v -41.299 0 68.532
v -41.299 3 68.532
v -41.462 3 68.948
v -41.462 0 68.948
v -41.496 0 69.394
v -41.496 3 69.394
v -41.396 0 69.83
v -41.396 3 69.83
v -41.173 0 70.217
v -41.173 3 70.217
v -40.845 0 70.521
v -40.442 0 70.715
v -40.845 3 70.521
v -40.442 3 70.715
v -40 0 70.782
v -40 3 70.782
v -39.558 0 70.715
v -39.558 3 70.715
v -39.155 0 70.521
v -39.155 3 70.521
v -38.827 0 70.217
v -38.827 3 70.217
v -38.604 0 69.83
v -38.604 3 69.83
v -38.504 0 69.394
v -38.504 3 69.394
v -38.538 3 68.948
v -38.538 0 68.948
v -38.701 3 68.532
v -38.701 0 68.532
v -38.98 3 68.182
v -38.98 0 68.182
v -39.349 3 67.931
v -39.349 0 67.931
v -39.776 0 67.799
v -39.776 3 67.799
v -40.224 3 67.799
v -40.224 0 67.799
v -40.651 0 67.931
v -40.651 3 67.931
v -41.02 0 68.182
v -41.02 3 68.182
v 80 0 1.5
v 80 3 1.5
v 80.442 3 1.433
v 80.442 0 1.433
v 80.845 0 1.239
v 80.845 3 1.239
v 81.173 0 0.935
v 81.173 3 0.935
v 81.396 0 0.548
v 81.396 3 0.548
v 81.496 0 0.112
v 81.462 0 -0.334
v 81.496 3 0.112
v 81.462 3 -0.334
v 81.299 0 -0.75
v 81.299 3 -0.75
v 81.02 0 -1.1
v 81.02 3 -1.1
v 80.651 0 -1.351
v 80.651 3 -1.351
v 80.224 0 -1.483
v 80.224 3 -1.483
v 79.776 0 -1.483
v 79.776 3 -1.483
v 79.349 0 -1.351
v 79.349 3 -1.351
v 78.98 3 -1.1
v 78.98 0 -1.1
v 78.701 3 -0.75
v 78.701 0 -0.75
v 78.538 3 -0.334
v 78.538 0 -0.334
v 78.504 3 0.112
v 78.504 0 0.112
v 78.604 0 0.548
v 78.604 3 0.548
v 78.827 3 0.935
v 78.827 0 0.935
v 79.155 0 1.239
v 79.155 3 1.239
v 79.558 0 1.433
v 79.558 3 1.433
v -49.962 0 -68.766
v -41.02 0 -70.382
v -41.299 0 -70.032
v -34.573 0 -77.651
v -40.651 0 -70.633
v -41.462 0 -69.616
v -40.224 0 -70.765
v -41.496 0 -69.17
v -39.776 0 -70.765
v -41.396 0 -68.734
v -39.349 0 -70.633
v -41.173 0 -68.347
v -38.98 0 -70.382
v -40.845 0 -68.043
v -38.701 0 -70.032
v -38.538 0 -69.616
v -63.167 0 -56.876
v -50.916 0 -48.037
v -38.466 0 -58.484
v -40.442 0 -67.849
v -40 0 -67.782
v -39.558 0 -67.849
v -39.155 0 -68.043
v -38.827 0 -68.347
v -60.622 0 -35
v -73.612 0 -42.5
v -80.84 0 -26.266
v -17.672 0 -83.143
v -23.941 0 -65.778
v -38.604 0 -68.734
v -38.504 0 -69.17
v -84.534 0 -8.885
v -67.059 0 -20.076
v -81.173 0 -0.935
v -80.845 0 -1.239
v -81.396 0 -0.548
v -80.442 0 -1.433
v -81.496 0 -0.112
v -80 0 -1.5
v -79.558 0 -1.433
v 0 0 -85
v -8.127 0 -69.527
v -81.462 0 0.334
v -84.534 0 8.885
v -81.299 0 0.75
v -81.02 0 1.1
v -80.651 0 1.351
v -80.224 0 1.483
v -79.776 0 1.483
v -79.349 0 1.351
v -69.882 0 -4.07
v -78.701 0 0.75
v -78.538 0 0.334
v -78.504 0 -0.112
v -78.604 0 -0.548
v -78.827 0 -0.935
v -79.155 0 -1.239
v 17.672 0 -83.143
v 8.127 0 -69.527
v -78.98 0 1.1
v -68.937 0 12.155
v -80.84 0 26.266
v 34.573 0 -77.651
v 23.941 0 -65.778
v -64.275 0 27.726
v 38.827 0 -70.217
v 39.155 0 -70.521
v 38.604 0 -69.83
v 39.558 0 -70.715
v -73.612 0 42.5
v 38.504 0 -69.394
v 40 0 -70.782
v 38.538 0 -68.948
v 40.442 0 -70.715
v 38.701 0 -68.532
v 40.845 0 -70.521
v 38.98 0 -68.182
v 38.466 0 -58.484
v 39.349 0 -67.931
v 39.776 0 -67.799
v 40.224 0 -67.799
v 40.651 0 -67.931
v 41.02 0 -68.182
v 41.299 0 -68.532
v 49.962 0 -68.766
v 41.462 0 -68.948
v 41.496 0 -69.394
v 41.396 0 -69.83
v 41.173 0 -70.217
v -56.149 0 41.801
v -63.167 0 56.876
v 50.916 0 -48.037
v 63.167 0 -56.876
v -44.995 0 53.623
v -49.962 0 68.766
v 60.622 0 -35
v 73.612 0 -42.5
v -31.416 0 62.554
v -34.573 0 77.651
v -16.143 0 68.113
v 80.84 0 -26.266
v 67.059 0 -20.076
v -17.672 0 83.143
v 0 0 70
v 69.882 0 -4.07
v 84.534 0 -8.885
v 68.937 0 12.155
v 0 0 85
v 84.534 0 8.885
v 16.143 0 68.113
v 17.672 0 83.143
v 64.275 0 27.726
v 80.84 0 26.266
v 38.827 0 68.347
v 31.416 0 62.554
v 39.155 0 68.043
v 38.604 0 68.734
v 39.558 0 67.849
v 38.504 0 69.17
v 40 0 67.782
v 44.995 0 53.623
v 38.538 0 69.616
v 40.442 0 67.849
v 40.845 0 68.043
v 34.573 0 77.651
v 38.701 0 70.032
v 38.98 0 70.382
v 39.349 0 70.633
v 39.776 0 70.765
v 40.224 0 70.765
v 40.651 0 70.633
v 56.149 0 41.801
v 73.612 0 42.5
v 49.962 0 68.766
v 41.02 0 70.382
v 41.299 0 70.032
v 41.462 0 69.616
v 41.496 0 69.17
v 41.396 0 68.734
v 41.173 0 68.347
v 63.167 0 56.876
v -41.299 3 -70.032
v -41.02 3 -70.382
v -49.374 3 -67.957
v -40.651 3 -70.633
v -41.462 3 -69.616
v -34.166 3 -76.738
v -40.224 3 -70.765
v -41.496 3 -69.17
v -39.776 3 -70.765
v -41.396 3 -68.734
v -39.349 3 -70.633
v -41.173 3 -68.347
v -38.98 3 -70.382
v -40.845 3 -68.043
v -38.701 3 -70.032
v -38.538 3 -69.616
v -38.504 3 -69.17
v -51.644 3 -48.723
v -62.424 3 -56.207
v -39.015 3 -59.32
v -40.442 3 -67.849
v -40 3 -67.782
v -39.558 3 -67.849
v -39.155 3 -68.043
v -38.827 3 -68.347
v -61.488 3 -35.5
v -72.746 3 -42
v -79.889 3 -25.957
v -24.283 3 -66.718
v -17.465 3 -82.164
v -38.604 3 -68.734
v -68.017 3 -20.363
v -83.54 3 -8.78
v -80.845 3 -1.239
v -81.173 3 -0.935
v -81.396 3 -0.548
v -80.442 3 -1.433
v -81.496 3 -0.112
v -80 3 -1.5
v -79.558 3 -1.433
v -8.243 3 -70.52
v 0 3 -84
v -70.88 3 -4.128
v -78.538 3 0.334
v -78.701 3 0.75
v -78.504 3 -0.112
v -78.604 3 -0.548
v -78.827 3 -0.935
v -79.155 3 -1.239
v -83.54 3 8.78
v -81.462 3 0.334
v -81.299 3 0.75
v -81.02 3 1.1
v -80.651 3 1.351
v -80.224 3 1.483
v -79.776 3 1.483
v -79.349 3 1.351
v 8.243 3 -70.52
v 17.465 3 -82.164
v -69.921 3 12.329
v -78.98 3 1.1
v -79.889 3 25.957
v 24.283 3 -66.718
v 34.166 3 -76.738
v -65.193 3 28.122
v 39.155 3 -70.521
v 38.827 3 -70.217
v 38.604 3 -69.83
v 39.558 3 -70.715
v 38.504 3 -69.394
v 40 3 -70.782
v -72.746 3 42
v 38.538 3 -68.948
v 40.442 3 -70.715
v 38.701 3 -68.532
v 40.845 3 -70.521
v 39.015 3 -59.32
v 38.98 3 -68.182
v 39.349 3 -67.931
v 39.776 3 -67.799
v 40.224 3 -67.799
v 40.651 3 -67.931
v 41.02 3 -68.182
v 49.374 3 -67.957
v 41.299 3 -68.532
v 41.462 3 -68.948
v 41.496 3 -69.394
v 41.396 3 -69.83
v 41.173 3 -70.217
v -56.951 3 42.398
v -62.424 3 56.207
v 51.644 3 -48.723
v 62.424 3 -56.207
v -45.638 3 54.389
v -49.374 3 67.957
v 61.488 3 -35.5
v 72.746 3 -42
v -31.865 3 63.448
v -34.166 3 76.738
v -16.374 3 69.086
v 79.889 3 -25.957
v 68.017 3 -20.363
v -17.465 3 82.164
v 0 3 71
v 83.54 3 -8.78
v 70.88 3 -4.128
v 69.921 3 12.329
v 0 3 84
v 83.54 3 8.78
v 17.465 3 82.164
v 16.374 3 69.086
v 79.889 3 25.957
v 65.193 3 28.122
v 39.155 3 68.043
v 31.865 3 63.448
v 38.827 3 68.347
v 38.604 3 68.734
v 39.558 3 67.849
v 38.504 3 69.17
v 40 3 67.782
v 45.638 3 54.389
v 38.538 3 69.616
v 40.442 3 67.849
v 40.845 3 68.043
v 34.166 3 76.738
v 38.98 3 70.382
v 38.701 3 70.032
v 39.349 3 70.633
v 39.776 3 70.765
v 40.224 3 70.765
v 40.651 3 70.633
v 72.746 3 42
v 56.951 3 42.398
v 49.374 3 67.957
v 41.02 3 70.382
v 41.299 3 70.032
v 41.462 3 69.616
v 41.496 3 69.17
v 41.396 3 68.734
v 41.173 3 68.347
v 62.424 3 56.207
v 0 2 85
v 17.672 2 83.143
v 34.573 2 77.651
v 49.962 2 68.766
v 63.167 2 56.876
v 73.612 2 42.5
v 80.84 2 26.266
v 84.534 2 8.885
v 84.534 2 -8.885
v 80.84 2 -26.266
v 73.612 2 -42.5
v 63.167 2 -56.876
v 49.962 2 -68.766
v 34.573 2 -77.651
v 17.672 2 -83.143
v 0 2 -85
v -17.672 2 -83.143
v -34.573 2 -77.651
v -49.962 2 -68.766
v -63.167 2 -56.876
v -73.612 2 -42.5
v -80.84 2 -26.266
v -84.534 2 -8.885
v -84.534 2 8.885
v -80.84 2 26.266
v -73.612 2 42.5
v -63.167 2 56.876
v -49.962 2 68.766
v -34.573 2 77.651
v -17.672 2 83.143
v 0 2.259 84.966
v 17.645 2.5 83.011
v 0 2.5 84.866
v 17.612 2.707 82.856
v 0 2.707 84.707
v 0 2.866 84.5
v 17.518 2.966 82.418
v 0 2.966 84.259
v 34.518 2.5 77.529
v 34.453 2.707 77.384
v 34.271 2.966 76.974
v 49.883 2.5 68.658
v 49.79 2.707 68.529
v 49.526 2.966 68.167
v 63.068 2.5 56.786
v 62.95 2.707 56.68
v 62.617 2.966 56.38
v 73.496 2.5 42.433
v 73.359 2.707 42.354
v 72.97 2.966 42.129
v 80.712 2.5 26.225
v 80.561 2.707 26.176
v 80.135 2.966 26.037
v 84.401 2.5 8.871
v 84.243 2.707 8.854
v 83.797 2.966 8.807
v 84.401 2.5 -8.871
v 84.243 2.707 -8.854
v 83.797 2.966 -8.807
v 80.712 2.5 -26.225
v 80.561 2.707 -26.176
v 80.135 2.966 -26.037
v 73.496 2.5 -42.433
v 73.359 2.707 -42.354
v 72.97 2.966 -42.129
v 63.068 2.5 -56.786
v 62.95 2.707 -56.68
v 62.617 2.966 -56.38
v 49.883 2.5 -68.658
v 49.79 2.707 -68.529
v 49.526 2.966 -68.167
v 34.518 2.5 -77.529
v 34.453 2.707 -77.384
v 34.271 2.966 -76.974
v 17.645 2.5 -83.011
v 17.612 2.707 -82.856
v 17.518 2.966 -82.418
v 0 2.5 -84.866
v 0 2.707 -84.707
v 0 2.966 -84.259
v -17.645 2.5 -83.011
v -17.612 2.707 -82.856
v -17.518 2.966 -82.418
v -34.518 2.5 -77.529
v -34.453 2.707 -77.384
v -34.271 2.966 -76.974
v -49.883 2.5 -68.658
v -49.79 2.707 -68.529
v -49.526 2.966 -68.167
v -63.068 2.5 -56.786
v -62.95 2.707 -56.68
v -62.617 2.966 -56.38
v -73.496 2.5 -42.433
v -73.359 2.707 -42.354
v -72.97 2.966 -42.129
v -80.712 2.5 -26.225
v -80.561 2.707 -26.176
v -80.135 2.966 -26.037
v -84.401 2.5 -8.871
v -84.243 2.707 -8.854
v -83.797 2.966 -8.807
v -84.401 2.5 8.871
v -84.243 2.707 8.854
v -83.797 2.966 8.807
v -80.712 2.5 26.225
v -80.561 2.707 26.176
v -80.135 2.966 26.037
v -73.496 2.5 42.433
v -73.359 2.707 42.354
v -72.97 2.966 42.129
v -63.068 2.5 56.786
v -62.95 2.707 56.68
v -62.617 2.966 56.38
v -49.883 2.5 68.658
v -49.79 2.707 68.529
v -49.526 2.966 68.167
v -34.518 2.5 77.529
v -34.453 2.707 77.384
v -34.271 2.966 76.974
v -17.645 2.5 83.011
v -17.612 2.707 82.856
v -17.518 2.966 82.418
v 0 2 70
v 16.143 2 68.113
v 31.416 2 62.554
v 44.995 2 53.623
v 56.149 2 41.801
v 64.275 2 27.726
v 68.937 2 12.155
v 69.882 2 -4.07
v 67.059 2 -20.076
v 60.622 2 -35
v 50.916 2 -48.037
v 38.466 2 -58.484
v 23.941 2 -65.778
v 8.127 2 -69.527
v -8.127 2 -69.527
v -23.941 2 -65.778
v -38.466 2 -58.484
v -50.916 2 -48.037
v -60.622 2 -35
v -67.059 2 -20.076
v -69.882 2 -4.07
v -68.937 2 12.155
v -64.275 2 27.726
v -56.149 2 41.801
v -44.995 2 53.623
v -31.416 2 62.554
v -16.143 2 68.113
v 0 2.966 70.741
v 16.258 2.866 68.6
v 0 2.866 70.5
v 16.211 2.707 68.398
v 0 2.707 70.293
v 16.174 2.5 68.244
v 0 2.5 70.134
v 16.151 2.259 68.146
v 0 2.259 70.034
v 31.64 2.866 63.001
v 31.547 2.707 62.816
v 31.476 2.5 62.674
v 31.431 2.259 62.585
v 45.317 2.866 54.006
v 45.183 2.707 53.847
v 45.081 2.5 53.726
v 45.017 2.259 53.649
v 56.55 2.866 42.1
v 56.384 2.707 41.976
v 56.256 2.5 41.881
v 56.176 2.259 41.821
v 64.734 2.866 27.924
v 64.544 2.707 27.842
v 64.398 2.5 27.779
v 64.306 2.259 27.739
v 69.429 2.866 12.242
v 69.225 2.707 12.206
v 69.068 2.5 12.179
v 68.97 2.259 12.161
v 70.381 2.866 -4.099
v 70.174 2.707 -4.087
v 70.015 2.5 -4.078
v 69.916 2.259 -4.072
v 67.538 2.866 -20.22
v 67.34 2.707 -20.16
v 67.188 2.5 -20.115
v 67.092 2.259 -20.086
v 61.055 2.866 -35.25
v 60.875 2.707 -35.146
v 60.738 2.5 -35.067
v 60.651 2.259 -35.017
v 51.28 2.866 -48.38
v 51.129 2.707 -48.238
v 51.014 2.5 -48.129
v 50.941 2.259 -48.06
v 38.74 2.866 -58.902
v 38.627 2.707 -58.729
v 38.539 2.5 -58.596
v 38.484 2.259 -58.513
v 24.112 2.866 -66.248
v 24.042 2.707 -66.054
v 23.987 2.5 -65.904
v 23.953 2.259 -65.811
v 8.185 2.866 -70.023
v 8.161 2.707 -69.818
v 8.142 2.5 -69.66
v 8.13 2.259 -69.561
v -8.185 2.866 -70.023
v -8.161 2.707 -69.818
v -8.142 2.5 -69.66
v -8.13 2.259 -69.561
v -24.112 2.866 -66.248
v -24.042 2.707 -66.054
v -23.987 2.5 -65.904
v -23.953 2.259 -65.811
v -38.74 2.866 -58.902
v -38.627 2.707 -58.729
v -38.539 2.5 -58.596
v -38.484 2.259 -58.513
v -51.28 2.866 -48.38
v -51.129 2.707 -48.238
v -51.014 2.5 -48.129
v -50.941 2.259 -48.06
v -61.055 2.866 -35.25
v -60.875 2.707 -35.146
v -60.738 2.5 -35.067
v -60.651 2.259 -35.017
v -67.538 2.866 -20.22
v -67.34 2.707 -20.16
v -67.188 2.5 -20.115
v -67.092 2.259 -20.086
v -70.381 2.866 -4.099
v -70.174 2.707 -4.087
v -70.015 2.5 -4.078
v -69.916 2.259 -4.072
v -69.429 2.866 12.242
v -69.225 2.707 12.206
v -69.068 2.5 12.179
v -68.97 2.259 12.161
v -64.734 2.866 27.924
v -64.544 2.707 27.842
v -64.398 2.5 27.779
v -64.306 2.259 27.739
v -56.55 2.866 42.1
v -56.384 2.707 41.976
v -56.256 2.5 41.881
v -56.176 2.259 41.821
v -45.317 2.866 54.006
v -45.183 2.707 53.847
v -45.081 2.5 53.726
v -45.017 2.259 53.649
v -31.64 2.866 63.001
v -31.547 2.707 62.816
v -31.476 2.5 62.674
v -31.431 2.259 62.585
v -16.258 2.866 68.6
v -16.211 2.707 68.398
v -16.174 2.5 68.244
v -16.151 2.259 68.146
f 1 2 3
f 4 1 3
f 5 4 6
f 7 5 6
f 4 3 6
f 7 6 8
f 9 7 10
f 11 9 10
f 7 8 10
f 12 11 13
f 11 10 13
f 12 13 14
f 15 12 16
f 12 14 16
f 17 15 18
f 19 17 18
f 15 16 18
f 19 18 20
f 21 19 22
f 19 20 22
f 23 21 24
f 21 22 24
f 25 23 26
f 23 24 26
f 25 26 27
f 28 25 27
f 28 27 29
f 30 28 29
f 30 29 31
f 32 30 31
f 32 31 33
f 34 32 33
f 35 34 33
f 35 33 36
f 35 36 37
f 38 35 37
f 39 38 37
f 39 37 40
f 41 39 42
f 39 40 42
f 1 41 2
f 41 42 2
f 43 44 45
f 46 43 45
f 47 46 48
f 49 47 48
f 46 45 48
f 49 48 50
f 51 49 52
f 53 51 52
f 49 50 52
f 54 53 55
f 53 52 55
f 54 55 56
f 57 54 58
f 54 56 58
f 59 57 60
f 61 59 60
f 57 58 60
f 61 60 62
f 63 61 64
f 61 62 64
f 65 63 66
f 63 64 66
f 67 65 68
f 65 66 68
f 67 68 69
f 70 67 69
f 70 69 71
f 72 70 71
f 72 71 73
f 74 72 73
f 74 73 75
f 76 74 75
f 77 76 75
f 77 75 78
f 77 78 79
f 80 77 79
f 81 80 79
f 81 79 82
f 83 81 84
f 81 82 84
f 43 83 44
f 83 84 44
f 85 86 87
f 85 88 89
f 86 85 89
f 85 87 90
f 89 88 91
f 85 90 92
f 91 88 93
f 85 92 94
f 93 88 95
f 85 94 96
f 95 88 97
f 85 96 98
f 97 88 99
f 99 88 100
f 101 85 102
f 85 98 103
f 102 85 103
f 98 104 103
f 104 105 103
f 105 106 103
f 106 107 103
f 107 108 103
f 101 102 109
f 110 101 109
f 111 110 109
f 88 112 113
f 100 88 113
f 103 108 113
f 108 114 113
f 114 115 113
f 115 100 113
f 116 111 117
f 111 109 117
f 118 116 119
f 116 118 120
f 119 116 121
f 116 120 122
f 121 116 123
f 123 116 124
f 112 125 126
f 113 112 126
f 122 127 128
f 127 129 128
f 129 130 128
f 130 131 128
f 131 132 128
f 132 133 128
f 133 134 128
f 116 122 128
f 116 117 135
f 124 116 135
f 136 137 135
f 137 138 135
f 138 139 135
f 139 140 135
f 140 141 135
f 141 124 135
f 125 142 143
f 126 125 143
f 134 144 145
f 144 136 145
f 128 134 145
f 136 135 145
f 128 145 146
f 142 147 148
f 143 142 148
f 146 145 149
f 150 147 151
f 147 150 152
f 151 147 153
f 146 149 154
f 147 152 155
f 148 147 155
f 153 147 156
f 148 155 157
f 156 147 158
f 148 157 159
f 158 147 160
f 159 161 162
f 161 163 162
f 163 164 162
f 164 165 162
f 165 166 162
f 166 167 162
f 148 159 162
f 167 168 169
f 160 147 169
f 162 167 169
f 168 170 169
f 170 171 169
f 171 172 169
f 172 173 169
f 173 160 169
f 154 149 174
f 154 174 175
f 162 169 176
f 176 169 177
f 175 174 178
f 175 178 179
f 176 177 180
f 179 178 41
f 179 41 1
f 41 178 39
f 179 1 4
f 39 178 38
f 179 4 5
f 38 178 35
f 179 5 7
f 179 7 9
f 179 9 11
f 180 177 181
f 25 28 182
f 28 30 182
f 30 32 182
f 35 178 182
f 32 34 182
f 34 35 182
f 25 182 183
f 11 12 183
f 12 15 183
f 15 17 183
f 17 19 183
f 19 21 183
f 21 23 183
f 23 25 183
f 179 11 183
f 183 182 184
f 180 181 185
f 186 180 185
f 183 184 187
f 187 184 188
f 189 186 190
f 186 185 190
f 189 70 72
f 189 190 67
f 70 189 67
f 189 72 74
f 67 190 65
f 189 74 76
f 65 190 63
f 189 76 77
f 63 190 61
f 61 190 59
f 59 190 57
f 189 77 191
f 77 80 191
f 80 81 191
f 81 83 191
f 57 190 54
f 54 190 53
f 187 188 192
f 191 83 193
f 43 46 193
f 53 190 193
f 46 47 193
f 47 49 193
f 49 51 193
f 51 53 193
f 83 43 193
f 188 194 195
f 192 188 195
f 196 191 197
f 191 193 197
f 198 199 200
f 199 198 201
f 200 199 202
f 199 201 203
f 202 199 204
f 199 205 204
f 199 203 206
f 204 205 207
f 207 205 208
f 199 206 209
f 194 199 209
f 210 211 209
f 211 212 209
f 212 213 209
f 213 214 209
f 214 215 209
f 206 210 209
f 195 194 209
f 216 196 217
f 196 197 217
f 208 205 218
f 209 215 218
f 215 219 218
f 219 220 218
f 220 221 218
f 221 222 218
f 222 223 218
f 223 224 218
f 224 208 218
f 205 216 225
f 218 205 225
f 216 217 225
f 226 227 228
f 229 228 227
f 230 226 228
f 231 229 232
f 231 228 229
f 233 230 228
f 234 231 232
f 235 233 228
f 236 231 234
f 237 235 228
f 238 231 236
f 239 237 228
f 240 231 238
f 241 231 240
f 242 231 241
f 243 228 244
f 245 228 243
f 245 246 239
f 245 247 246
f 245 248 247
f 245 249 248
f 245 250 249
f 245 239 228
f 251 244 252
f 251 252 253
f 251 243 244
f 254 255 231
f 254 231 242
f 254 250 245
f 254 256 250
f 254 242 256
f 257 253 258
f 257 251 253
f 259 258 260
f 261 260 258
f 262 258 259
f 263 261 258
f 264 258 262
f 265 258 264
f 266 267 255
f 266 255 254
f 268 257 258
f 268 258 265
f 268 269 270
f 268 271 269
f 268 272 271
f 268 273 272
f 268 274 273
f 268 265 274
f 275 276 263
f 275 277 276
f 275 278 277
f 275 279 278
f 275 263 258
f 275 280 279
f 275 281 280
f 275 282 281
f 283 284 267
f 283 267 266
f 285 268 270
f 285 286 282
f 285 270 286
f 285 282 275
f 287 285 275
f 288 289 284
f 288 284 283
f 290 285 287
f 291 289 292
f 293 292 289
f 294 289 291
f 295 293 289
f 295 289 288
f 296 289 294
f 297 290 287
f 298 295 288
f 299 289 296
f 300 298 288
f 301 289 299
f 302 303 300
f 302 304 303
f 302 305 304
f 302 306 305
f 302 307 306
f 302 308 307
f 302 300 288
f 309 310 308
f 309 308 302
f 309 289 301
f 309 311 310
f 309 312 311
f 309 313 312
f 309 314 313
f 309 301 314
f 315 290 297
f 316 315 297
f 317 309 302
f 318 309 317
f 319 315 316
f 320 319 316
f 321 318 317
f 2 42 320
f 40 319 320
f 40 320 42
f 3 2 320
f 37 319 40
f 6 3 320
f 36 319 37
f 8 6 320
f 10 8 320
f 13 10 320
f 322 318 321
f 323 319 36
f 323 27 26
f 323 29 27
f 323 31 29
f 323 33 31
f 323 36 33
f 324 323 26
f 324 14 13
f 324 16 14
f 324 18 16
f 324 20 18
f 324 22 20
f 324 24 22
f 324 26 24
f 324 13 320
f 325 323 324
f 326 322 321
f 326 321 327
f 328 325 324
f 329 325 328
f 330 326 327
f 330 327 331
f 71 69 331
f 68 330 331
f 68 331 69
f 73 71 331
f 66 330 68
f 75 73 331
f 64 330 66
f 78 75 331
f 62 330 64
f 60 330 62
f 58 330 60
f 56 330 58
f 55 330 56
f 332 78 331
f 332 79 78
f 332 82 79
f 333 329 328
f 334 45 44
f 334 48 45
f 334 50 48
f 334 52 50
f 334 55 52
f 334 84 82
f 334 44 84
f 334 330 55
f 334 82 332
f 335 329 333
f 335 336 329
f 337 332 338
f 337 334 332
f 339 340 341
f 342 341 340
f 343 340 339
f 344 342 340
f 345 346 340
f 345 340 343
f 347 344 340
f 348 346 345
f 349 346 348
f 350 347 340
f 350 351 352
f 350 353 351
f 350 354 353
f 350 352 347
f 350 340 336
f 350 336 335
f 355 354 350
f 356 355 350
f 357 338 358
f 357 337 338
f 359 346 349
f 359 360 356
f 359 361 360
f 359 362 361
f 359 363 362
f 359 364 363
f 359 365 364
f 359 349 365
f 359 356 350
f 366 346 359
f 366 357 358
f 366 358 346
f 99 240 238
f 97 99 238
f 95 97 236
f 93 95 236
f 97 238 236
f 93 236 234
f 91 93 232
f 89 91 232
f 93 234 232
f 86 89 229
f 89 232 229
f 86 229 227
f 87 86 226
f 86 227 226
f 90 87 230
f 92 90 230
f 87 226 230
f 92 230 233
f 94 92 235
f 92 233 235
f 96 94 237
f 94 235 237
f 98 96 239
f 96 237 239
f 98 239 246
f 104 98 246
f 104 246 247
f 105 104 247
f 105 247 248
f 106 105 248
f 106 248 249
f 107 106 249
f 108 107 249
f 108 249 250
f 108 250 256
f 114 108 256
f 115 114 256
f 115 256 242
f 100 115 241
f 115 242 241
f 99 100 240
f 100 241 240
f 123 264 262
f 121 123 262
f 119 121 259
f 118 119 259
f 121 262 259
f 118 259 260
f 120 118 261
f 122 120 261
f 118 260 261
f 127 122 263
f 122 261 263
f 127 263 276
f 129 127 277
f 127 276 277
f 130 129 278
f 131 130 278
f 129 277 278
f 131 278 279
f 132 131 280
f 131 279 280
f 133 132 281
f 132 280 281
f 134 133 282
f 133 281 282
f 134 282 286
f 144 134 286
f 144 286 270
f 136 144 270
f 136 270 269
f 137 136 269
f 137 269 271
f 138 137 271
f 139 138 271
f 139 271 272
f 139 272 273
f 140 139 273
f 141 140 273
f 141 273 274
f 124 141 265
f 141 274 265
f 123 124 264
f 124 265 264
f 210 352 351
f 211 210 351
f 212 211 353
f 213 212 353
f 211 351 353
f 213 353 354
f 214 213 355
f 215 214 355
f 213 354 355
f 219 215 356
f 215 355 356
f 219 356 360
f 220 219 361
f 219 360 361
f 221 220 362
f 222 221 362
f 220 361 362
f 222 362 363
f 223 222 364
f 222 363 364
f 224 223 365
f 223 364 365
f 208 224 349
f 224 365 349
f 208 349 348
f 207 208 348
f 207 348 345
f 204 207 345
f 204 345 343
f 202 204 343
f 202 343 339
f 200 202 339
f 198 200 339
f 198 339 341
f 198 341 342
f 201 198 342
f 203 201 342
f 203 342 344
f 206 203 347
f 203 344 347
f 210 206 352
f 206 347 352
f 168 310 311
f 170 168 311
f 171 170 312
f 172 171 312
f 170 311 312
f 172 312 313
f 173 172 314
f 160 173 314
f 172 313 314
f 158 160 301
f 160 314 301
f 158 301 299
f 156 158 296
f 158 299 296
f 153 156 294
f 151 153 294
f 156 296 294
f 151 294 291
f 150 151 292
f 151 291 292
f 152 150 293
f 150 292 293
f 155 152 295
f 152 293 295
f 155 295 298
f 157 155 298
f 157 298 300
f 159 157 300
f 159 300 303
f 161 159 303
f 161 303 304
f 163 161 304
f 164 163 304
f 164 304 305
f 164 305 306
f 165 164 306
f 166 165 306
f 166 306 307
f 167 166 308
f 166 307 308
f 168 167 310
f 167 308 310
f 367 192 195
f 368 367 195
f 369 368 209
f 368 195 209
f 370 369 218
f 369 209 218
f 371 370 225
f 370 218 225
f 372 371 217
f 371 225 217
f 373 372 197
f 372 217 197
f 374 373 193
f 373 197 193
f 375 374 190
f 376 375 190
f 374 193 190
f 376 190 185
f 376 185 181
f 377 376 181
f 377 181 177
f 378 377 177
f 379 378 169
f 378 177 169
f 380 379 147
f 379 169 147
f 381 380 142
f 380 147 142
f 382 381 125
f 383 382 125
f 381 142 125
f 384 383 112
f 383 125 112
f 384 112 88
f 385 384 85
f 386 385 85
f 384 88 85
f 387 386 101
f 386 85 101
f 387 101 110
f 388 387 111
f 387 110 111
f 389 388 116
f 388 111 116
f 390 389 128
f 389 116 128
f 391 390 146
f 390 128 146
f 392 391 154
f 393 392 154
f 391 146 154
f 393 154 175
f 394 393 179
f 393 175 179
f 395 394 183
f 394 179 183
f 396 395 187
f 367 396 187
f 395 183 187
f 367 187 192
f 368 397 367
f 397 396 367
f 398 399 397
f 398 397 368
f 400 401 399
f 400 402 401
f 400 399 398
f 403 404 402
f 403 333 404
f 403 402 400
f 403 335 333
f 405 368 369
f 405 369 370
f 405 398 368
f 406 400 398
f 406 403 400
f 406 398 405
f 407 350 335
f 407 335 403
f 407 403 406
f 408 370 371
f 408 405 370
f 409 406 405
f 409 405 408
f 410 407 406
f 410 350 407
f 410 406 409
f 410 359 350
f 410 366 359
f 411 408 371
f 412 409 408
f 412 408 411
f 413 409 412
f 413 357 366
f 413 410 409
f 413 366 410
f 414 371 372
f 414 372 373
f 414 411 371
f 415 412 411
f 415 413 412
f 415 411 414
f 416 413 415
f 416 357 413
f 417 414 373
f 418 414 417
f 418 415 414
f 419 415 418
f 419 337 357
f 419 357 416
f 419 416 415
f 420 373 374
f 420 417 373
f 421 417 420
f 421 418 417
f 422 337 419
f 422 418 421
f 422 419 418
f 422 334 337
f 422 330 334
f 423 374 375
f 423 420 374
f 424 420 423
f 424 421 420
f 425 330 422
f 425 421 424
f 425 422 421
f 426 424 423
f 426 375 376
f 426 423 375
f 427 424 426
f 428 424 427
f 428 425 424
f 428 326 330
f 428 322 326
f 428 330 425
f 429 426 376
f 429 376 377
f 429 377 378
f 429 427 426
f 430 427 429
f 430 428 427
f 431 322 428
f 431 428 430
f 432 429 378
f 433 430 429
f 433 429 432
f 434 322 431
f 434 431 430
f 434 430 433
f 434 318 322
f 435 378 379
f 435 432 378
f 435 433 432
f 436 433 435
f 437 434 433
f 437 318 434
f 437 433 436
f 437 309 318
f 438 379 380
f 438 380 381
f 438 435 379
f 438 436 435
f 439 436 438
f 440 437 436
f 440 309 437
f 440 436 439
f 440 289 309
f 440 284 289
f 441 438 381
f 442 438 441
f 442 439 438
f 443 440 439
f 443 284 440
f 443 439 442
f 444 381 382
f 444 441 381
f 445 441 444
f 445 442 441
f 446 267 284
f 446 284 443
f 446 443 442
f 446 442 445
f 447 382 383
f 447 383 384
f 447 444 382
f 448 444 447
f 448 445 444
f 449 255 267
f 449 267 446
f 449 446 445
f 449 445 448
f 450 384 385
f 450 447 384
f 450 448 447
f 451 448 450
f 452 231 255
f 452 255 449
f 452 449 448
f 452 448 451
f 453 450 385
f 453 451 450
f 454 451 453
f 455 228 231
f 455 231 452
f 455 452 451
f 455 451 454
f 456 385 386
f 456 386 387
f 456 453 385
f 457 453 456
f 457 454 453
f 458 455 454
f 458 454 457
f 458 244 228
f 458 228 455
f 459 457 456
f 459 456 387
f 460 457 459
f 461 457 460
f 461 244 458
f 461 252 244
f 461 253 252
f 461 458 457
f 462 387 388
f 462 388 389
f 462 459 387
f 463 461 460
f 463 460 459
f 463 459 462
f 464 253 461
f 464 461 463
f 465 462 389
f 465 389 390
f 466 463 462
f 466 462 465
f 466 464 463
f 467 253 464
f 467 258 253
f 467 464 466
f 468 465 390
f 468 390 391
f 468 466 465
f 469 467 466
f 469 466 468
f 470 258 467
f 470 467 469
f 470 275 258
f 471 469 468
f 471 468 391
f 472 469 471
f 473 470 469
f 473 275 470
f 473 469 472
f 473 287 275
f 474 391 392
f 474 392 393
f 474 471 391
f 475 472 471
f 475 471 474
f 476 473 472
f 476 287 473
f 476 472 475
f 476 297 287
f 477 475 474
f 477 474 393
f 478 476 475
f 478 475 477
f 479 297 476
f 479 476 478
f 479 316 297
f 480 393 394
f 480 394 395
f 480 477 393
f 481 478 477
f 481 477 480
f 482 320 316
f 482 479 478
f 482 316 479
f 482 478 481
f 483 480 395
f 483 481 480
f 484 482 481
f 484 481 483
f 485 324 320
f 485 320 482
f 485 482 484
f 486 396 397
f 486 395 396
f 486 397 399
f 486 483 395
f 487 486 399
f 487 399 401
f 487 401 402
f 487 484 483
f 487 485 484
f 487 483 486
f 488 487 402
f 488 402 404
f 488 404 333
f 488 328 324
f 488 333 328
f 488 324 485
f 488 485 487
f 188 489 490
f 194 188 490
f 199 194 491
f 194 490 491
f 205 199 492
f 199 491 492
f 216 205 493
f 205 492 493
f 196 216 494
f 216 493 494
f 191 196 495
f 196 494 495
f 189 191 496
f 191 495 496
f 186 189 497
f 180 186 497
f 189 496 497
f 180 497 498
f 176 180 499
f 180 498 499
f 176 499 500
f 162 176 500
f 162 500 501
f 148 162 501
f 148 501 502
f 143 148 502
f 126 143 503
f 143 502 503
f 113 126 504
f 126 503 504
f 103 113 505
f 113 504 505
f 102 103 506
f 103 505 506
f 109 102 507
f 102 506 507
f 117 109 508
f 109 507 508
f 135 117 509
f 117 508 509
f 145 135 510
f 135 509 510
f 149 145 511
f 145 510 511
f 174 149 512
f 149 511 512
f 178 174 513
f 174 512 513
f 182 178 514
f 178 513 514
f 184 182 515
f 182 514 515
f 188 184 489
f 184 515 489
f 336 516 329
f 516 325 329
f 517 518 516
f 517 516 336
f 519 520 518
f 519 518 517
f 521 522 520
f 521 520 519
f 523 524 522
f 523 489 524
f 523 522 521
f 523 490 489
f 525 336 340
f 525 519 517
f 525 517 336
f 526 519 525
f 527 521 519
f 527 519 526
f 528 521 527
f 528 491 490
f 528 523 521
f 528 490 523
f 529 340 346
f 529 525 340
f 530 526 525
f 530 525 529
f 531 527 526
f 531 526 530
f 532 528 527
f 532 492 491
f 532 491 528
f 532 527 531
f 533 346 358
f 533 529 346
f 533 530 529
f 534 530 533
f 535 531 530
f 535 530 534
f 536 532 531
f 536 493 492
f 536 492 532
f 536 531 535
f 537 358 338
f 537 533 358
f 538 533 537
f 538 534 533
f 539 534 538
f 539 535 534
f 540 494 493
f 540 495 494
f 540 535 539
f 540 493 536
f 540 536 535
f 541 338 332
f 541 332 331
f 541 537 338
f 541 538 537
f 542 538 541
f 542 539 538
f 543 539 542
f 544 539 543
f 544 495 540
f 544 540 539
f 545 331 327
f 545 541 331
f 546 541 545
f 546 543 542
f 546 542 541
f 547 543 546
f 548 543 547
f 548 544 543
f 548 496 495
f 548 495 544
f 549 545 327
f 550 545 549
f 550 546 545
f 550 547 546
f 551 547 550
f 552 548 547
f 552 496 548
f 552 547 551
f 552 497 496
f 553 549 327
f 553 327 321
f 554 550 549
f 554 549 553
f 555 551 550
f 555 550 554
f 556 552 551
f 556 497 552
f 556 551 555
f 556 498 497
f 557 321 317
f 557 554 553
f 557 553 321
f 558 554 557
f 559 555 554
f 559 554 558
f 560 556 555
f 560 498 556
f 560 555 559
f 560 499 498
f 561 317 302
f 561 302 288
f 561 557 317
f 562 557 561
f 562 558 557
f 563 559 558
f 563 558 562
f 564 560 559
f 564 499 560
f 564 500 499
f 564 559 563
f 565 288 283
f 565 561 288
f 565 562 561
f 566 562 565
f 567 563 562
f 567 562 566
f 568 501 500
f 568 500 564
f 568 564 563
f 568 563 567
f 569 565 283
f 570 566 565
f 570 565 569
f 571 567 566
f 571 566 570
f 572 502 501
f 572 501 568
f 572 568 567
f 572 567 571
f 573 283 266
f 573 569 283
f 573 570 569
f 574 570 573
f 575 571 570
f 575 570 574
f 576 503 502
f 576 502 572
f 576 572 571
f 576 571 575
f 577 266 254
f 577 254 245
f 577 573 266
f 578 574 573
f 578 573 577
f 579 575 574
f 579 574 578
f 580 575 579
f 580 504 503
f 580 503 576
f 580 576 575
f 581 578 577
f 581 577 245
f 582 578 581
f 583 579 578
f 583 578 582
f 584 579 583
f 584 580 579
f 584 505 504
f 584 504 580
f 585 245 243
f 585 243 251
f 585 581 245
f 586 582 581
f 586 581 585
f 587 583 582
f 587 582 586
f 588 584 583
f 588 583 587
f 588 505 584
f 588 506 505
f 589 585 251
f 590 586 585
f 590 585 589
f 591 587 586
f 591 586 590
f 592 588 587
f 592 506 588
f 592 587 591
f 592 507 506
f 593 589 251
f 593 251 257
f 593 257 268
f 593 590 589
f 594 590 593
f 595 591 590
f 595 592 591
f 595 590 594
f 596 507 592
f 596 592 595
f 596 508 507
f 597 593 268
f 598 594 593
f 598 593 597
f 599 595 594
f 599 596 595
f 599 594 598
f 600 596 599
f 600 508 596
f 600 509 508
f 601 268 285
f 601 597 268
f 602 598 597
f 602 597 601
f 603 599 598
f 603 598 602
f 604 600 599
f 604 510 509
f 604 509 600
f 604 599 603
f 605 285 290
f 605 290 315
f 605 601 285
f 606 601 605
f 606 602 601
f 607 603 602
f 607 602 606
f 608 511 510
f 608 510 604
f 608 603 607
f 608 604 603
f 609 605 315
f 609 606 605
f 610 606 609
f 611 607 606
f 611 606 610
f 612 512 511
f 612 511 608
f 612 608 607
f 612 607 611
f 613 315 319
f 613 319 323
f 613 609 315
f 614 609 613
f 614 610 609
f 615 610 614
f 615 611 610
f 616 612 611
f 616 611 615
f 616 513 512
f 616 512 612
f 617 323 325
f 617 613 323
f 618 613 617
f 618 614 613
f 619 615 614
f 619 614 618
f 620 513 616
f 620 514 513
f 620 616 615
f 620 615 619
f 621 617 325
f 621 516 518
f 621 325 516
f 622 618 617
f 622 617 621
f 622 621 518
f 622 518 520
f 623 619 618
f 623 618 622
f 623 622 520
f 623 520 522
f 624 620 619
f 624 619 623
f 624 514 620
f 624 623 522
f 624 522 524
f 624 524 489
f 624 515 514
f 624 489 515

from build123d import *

# Parameters (mm, degrees)
ESQUISSE1_R                  = 85
BOSS_EXTRU_1_DEPTH           = 3
ESQUISSE2_R                  = 70
ENL_V_MAT_EXTRU_1_DEPTH      = 3
ESQUISSE3_R                  = 1.5
ENL_V_MAT_EXTRU_2_DEPTH      = 3
R_P_TITION_CIRCULAIRE1_COUNT = 6
CONG_1_R                     = 1


with BuildPart() as part:
    # Esquisse1 → Boss.-Extru.1 (new body)
    with BuildSketch(Plane(origin=(0, 0, 0), x_dir=(1, 0, 0), z_dir=(0, 1, 0))):
        with Locations(Location((0, 0, 0), (0, 0, 270))):
            Circle(ESQUISSE1_R)
    extrude(amount=BOSS_EXTRU_1_DEPTH)

    # Esquisse2 → Enlèv. mat.-Extru.1 (cut)
    with BuildSketch(Plane(origin=(0, 3, 0), x_dir=(1, 0, 0), z_dir=(0, 1, 0))):
        with Locations(Location((0, 0, 0), (0, 0, 270))):
            Circle(ESQUISSE2_R)
    extrude(amount=-ENL_V_MAT_EXTRU_1_DEPTH, mode=Mode.SUBTRACT)

    # Esquisse3 → Enlèv. mat.-Extru.2 (cut)
    with BuildSketch(Plane(origin=(0, 3, 0), x_dir=(1, 0, 0), z_dir=(0, 1, 0))):
        with Locations(Location((80, 0, 0), (0, 0, 270))):
            Circle(ESQUISSE3_R)
    enl_v_mat_extru_2 = extrude(amount=-ENL_V_MAT_EXTRU_2_DEPTH, mode=Mode.SUBTRACT)

    # Répétition circulaire1: Enlèv. mat.-Extru.2 ×6 about axis
    r_p_tition_circulaire1_axis = Axis((0, 0, 0), (0, 1, 0))
    for i in range(1, R_P_TITION_CIRCULAIRE1_COUNT):
        add(enl_v_mat_extru_2.rotate(r_p_tition_circulaire1_axis, i * 360 / R_P_TITION_CIRCULAIRE1_COUNT), mode=Mode.SUBTRACT)

    # Congé1
    cong_1_edges = [part.edges().sort_by_distance(p)[0] for p in [
        (0, 3, -85),
        (0, 3, -70),
    ]]
    fillet(cong_1_edges, radius=CONG_1_R)


solid = part.part
